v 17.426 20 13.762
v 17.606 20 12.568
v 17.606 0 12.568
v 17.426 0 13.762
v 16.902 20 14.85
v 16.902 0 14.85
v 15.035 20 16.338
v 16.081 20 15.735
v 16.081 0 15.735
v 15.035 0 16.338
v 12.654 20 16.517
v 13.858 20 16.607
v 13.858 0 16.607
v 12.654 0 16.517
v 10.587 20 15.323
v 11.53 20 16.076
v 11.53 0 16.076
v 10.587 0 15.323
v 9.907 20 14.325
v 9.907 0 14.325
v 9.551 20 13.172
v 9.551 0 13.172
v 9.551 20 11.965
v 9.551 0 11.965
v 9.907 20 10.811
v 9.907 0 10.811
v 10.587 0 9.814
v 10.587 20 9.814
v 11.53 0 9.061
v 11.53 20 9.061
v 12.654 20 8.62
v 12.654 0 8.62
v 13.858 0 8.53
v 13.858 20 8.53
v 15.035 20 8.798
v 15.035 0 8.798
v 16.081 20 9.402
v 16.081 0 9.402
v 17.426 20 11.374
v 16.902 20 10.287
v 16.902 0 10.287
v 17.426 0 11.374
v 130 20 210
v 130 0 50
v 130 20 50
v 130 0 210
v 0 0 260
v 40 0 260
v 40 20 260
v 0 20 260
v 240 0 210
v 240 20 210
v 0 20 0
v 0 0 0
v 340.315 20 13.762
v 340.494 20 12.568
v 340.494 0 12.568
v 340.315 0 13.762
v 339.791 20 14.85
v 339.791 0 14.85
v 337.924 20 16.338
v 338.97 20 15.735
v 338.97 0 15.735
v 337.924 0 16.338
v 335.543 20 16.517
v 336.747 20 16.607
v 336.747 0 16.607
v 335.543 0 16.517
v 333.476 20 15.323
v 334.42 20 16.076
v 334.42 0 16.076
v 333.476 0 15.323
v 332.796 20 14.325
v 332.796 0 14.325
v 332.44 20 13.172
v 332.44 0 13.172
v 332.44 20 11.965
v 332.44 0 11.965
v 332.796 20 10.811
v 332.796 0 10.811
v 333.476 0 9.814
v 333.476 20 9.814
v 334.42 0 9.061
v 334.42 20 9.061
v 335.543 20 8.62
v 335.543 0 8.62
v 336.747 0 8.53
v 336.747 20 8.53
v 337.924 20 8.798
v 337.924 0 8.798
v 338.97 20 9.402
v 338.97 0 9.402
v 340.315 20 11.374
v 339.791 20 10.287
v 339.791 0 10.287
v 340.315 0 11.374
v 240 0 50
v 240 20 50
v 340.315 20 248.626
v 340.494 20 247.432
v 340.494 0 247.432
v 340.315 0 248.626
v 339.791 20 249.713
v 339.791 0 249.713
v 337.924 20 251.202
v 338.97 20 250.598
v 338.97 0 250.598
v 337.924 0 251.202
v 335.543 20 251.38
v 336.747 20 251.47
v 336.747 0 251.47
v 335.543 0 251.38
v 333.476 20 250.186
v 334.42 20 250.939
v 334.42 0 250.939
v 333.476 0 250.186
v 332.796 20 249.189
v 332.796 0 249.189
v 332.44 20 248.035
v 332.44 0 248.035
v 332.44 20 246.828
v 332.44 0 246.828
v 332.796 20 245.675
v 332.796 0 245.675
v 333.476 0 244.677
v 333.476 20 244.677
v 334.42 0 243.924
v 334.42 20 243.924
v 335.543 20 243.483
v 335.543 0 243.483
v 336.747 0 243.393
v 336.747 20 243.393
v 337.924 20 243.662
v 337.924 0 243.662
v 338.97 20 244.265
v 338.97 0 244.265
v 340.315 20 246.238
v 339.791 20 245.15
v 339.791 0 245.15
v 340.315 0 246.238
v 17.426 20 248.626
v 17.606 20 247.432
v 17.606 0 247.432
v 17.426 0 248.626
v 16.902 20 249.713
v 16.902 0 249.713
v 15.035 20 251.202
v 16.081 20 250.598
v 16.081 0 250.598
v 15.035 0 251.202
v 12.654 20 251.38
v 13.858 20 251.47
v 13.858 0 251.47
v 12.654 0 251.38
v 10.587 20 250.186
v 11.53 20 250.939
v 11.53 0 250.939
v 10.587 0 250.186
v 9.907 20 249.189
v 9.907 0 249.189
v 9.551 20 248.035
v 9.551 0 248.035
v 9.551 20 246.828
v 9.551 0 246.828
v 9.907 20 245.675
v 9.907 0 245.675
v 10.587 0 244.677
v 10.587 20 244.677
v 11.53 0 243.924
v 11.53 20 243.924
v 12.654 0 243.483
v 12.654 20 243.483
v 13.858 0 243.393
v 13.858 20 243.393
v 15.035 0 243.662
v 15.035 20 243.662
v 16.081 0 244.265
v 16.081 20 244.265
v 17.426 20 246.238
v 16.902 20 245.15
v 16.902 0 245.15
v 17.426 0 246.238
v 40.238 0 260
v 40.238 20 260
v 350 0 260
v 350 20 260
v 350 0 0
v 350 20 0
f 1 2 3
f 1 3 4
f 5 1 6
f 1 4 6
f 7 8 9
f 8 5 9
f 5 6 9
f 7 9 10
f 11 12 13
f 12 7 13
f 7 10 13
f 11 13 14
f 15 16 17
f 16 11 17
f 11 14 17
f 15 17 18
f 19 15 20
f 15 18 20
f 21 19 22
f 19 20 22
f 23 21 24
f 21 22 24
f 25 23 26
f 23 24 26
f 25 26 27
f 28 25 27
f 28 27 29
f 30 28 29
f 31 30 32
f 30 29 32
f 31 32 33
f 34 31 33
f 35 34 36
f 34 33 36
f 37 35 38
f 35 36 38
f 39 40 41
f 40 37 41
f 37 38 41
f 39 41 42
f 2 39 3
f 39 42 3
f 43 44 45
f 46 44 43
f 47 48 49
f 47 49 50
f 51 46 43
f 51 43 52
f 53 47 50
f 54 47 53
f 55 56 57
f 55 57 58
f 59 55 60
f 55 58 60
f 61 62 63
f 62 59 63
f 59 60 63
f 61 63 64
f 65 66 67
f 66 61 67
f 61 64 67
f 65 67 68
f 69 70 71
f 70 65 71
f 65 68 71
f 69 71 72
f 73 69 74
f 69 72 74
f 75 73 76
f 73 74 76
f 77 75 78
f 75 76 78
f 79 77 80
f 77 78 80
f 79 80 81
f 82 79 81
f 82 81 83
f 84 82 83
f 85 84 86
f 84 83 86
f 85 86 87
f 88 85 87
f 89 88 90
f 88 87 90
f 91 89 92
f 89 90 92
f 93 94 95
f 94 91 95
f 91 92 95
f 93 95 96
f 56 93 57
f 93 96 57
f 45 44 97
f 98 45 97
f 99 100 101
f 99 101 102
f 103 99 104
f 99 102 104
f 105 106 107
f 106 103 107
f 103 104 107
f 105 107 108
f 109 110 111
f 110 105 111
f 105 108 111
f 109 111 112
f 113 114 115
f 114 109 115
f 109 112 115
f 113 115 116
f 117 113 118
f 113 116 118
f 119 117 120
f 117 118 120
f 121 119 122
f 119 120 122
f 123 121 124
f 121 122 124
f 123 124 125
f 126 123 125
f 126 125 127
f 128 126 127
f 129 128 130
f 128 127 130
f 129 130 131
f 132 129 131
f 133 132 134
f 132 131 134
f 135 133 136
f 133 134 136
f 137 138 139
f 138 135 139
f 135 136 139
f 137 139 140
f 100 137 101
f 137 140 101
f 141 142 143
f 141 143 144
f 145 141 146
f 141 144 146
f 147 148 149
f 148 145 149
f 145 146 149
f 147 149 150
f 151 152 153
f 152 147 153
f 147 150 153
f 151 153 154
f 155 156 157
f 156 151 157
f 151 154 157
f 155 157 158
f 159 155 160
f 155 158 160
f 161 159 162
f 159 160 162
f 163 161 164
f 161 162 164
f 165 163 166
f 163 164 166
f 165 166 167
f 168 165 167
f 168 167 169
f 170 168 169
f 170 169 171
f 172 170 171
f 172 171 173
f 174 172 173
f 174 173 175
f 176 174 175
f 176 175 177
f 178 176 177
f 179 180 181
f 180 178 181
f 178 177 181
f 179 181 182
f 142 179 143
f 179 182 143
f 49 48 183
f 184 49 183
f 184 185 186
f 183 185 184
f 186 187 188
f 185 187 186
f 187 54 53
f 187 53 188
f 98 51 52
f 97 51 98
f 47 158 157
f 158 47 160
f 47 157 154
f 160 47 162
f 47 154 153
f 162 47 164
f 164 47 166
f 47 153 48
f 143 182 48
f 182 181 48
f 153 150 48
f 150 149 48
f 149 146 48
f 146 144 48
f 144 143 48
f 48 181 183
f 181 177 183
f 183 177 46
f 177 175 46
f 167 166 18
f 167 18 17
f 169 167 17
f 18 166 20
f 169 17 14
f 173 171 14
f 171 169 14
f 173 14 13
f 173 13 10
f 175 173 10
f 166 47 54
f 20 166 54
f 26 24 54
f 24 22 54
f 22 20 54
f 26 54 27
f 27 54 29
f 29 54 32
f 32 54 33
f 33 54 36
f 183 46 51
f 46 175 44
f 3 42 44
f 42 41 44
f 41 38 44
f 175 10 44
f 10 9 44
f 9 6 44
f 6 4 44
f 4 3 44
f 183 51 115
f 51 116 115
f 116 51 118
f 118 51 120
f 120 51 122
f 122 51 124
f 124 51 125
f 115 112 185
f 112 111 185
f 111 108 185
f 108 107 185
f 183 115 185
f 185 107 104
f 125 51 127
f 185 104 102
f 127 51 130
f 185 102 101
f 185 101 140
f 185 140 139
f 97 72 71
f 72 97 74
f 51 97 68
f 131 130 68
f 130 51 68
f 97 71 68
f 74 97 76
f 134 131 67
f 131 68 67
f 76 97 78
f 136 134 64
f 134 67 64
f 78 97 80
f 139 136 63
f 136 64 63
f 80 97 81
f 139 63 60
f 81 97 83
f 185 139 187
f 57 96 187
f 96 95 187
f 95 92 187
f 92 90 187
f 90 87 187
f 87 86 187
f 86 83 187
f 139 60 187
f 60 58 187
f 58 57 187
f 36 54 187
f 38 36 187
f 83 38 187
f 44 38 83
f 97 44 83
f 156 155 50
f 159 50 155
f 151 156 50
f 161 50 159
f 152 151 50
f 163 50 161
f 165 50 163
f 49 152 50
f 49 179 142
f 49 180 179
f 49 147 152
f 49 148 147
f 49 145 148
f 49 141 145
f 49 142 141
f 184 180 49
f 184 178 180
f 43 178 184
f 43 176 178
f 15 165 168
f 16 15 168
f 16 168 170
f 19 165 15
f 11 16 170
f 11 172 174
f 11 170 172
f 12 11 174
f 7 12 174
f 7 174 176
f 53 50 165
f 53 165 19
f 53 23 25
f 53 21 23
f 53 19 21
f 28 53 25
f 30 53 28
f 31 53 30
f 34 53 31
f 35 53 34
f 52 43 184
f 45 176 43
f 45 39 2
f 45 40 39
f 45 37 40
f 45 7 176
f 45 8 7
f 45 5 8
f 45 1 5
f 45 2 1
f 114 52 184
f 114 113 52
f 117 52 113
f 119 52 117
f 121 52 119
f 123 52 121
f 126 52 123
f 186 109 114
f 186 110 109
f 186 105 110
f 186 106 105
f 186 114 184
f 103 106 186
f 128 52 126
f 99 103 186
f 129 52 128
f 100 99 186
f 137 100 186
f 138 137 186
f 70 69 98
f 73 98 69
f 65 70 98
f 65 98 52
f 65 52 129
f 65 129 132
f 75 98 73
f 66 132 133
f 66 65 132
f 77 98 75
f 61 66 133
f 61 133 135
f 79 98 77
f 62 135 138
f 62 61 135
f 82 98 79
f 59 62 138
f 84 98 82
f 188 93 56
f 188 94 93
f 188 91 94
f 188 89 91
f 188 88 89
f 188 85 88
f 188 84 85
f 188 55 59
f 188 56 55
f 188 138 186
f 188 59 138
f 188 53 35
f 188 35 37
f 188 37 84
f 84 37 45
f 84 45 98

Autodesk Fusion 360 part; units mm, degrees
sketch "Sketch1" plane through (0, 0, 0) normal (0, 1, 0) x (1, 0, 0)
  line L0 (0, 0) -> (350, 0)
  line L1 (350, 0) -> (350, -260)
  line L2 (350, -260) -> (0, -260)
  line L3 (0, -260) -> (0, 0)
  circle A0 centre (13.5555, -247.4318) radius 4.05
  line L4 (175, -260) -> (175, 0) construction
  line L5 (0, -130) -> (350, -130) construction
  line L6 (350, -130) -> (0, -130) construction
  circle A1 centre (336.4445, -247.4318) radius 4.05
  circle A2 centre (336.4445, -12.5682) radius 4.05
  circle A3 centre (13.5555, -12.5682) radius 4.05
  line L7 (40, -260) -> (40.238, -260)
  line L8 (130, -50) -> (240, -50)
  line L9 (130, -50) -> (130, -210)
  line L10 (130, -210) -> (240, -210)
  line L11 (240, -210) -> (240, -50)
  dimension "d1" = 350
  dimension "d2" = 260
  dimension "d3" = 8.1
extrude "Extrude1" add sketch "Sketch1" along normal blind 20
